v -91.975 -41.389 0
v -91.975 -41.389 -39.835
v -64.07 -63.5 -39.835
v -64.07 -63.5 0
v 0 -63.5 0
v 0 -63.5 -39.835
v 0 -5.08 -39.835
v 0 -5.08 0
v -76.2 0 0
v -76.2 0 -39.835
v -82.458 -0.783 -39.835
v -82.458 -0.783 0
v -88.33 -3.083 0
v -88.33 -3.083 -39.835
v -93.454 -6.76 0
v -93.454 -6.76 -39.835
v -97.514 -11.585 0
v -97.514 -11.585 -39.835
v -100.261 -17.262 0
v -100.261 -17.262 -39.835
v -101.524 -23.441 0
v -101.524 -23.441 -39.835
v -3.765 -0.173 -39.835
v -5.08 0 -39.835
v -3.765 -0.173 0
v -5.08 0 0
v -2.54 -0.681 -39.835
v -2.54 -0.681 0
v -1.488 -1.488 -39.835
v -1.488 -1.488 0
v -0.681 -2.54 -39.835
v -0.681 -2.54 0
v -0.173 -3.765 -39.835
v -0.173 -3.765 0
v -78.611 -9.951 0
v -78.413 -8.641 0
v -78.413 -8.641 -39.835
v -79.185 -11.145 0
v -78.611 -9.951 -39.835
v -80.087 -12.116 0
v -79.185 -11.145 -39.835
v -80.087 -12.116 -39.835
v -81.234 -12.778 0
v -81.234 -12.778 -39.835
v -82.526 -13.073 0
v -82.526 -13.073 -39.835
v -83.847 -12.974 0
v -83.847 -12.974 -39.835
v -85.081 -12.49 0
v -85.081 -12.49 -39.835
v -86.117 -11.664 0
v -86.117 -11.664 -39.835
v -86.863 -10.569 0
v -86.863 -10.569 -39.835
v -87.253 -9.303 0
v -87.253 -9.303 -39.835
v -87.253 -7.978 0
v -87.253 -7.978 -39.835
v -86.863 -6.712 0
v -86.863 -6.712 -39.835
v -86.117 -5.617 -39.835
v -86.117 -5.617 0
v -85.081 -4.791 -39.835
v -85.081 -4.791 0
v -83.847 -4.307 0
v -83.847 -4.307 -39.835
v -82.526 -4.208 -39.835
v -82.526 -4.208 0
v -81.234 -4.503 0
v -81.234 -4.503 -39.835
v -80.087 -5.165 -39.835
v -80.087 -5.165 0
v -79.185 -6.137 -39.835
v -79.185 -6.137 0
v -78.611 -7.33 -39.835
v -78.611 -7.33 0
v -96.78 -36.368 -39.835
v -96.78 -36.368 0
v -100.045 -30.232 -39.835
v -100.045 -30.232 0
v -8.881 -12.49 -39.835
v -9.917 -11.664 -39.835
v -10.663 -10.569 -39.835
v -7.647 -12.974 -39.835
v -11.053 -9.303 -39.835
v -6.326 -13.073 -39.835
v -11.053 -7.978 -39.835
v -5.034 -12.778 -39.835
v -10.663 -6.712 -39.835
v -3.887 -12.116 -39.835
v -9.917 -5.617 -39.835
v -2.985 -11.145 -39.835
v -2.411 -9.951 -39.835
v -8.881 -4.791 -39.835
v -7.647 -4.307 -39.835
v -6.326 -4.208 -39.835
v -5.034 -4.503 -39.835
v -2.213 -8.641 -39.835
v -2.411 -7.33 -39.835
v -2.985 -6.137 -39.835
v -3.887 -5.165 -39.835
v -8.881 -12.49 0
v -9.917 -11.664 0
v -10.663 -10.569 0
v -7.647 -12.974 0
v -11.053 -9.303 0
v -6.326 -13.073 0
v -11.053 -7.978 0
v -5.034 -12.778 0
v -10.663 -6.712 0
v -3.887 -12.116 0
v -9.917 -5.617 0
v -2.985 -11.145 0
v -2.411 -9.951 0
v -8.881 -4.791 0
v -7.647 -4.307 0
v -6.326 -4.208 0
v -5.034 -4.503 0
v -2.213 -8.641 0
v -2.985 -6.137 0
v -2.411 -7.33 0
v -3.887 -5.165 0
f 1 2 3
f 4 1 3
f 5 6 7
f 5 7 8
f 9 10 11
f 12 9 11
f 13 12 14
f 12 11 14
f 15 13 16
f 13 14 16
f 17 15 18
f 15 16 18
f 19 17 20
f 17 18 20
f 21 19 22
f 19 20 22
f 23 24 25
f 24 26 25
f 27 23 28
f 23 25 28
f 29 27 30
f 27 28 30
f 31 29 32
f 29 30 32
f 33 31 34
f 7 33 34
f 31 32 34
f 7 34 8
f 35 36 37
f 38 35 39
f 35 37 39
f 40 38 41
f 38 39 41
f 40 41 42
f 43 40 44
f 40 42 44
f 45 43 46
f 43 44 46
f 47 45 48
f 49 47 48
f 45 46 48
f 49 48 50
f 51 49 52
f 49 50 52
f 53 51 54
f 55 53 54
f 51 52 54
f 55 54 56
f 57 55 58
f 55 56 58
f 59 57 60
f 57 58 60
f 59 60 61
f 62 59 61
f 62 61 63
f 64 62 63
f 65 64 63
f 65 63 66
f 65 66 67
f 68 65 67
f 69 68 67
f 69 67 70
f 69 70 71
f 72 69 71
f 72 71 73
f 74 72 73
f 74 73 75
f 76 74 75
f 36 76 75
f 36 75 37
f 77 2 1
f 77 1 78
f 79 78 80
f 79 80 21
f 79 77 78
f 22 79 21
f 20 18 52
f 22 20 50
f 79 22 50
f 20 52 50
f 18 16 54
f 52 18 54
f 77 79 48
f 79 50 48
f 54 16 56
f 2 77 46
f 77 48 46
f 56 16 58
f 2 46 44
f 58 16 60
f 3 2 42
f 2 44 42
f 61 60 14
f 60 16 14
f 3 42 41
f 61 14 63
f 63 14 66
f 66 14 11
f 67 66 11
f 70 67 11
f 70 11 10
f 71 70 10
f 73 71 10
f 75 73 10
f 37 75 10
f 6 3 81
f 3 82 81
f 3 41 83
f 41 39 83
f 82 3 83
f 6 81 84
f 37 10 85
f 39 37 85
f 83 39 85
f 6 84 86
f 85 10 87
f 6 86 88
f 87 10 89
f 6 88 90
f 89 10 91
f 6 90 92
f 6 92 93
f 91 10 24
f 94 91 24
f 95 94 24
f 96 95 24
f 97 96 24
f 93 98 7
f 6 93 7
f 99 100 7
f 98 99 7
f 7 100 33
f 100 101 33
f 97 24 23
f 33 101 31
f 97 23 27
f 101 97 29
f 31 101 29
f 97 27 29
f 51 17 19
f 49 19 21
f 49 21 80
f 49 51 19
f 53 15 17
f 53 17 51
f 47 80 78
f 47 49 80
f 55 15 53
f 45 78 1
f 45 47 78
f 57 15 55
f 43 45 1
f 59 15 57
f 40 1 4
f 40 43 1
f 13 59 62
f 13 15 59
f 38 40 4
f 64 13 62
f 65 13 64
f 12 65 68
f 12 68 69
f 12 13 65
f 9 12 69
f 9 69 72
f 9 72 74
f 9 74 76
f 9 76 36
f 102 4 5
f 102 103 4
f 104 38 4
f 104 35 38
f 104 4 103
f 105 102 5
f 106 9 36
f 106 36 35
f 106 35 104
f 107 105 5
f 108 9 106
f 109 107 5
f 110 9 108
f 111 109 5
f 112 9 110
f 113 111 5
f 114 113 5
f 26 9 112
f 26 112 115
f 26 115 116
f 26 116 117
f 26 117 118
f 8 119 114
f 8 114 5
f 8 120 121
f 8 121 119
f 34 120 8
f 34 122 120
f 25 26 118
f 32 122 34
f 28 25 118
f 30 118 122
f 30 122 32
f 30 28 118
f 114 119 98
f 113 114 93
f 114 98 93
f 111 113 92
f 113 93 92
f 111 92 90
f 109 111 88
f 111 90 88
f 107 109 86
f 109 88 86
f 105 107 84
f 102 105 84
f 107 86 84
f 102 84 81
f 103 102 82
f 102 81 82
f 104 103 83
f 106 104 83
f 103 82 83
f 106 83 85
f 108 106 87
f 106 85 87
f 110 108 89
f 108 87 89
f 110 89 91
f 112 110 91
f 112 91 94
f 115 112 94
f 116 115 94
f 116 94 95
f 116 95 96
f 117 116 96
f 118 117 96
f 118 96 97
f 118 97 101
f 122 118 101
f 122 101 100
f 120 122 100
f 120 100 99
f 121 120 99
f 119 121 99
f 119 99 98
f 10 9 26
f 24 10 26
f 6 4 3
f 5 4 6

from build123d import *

# Parameters (mm, degrees)
F0_W        = 101.6
F0_H        = 39.83482
F1_DEPTH    = 63.5
F3_DEPTH    = 106.68
F4_T1_DEPTH = 101.2392583659
F4_T3_DEPTH = 166.83482
F5_R        = 5.08
F6_R        = 4.445
F7_DEPTH    = 50.8


# Not quite as in the source:
# - a fillet or chamfer that OpenCascade refuses, or shapes differently, is made with other operations: its cross-section is extruded or revolved along the edge and cut away or added


with BuildPart() as f1:
    # F0 (on Front) → F1 (new body)
    with BuildSketch(Plane.XZ):
        with Locations((-50.8, -19.91741)):
            Rectangle(F0_W, F0_H)
    extrude(amount=F1_DEPTH)

    # F2 (on face) → F3 (cut)
    with BuildSketch(Plane(origin=(0, 0, -39.83482), x_dir=(1, 0, 0), z_dir=(0, 0, -1))):
        Polygon((-101.6, 63.5), (-101.6, 33.7622053921), (-64.0701651573, 63.5), align=None)
    extrude(amount=-F3_DEPTH, mode=Mode.SUBTRACT)

    # F4: fillet of radius 25.4 on 2 edges, made by hand

    # F4_s2 → F4_t1 (cut)
    with BuildSketch(Plane.XY.offset(-70.537039183)):
        with BuildLine():
            ThreePointArc((-91.9745517237, -41.389193495), (-99.0673742894, -32.5376820901), (-101.6, -21.4813177189))
            Line((-101.6, -21.4813177189), (-101.6, -33.7622053921))
            Line((-101.6, -33.7622053921), (-91.9745517237, -41.389193495))
        make_face()
    extrude(amount=F4_T1_DEPTH, mode=Mode.SUBTRACT)

    # F4_s4 → F4_t3 (cut)
    with BuildSketch(Plane.XY.offset(-103.33482)):
        with BuildLine():
            ThreePointArc((-76.2, 0), (-94.1605122421, -7.4394877579), (-101.6, -25.4))
            Line((-101.6, -25.4), (-101.6, 0))
            Line((-101.6, 0), (-76.2, 0))
        make_face()
    extrude(amount=F4_T3_DEPTH, mode=Mode.SUBTRACT)

    # F5
    f5_edges = [f1.edges().sort_by_distance(p)[0] for p in [
        (0, 0, -19.91741),
    ]]
    fillet(f5_edges, radius=F5_R)

    # F6 (on face) → F7 (cut)
    with BuildSketch(Plane(origin=(0, 0, -39.83482), x_dir=(1, 0, 0), z_dir=(0, 0, -1))):
        with Locations((-82.8581005335, 8.6406739429)):
            Circle(F6_R)
        with Locations((-6.6581005335, 8.6406739429)):
            Circle(F6_R)
    extrude(amount=-F7_DEPTH, mode=Mode.SUBTRACT)


solid = f1.part
